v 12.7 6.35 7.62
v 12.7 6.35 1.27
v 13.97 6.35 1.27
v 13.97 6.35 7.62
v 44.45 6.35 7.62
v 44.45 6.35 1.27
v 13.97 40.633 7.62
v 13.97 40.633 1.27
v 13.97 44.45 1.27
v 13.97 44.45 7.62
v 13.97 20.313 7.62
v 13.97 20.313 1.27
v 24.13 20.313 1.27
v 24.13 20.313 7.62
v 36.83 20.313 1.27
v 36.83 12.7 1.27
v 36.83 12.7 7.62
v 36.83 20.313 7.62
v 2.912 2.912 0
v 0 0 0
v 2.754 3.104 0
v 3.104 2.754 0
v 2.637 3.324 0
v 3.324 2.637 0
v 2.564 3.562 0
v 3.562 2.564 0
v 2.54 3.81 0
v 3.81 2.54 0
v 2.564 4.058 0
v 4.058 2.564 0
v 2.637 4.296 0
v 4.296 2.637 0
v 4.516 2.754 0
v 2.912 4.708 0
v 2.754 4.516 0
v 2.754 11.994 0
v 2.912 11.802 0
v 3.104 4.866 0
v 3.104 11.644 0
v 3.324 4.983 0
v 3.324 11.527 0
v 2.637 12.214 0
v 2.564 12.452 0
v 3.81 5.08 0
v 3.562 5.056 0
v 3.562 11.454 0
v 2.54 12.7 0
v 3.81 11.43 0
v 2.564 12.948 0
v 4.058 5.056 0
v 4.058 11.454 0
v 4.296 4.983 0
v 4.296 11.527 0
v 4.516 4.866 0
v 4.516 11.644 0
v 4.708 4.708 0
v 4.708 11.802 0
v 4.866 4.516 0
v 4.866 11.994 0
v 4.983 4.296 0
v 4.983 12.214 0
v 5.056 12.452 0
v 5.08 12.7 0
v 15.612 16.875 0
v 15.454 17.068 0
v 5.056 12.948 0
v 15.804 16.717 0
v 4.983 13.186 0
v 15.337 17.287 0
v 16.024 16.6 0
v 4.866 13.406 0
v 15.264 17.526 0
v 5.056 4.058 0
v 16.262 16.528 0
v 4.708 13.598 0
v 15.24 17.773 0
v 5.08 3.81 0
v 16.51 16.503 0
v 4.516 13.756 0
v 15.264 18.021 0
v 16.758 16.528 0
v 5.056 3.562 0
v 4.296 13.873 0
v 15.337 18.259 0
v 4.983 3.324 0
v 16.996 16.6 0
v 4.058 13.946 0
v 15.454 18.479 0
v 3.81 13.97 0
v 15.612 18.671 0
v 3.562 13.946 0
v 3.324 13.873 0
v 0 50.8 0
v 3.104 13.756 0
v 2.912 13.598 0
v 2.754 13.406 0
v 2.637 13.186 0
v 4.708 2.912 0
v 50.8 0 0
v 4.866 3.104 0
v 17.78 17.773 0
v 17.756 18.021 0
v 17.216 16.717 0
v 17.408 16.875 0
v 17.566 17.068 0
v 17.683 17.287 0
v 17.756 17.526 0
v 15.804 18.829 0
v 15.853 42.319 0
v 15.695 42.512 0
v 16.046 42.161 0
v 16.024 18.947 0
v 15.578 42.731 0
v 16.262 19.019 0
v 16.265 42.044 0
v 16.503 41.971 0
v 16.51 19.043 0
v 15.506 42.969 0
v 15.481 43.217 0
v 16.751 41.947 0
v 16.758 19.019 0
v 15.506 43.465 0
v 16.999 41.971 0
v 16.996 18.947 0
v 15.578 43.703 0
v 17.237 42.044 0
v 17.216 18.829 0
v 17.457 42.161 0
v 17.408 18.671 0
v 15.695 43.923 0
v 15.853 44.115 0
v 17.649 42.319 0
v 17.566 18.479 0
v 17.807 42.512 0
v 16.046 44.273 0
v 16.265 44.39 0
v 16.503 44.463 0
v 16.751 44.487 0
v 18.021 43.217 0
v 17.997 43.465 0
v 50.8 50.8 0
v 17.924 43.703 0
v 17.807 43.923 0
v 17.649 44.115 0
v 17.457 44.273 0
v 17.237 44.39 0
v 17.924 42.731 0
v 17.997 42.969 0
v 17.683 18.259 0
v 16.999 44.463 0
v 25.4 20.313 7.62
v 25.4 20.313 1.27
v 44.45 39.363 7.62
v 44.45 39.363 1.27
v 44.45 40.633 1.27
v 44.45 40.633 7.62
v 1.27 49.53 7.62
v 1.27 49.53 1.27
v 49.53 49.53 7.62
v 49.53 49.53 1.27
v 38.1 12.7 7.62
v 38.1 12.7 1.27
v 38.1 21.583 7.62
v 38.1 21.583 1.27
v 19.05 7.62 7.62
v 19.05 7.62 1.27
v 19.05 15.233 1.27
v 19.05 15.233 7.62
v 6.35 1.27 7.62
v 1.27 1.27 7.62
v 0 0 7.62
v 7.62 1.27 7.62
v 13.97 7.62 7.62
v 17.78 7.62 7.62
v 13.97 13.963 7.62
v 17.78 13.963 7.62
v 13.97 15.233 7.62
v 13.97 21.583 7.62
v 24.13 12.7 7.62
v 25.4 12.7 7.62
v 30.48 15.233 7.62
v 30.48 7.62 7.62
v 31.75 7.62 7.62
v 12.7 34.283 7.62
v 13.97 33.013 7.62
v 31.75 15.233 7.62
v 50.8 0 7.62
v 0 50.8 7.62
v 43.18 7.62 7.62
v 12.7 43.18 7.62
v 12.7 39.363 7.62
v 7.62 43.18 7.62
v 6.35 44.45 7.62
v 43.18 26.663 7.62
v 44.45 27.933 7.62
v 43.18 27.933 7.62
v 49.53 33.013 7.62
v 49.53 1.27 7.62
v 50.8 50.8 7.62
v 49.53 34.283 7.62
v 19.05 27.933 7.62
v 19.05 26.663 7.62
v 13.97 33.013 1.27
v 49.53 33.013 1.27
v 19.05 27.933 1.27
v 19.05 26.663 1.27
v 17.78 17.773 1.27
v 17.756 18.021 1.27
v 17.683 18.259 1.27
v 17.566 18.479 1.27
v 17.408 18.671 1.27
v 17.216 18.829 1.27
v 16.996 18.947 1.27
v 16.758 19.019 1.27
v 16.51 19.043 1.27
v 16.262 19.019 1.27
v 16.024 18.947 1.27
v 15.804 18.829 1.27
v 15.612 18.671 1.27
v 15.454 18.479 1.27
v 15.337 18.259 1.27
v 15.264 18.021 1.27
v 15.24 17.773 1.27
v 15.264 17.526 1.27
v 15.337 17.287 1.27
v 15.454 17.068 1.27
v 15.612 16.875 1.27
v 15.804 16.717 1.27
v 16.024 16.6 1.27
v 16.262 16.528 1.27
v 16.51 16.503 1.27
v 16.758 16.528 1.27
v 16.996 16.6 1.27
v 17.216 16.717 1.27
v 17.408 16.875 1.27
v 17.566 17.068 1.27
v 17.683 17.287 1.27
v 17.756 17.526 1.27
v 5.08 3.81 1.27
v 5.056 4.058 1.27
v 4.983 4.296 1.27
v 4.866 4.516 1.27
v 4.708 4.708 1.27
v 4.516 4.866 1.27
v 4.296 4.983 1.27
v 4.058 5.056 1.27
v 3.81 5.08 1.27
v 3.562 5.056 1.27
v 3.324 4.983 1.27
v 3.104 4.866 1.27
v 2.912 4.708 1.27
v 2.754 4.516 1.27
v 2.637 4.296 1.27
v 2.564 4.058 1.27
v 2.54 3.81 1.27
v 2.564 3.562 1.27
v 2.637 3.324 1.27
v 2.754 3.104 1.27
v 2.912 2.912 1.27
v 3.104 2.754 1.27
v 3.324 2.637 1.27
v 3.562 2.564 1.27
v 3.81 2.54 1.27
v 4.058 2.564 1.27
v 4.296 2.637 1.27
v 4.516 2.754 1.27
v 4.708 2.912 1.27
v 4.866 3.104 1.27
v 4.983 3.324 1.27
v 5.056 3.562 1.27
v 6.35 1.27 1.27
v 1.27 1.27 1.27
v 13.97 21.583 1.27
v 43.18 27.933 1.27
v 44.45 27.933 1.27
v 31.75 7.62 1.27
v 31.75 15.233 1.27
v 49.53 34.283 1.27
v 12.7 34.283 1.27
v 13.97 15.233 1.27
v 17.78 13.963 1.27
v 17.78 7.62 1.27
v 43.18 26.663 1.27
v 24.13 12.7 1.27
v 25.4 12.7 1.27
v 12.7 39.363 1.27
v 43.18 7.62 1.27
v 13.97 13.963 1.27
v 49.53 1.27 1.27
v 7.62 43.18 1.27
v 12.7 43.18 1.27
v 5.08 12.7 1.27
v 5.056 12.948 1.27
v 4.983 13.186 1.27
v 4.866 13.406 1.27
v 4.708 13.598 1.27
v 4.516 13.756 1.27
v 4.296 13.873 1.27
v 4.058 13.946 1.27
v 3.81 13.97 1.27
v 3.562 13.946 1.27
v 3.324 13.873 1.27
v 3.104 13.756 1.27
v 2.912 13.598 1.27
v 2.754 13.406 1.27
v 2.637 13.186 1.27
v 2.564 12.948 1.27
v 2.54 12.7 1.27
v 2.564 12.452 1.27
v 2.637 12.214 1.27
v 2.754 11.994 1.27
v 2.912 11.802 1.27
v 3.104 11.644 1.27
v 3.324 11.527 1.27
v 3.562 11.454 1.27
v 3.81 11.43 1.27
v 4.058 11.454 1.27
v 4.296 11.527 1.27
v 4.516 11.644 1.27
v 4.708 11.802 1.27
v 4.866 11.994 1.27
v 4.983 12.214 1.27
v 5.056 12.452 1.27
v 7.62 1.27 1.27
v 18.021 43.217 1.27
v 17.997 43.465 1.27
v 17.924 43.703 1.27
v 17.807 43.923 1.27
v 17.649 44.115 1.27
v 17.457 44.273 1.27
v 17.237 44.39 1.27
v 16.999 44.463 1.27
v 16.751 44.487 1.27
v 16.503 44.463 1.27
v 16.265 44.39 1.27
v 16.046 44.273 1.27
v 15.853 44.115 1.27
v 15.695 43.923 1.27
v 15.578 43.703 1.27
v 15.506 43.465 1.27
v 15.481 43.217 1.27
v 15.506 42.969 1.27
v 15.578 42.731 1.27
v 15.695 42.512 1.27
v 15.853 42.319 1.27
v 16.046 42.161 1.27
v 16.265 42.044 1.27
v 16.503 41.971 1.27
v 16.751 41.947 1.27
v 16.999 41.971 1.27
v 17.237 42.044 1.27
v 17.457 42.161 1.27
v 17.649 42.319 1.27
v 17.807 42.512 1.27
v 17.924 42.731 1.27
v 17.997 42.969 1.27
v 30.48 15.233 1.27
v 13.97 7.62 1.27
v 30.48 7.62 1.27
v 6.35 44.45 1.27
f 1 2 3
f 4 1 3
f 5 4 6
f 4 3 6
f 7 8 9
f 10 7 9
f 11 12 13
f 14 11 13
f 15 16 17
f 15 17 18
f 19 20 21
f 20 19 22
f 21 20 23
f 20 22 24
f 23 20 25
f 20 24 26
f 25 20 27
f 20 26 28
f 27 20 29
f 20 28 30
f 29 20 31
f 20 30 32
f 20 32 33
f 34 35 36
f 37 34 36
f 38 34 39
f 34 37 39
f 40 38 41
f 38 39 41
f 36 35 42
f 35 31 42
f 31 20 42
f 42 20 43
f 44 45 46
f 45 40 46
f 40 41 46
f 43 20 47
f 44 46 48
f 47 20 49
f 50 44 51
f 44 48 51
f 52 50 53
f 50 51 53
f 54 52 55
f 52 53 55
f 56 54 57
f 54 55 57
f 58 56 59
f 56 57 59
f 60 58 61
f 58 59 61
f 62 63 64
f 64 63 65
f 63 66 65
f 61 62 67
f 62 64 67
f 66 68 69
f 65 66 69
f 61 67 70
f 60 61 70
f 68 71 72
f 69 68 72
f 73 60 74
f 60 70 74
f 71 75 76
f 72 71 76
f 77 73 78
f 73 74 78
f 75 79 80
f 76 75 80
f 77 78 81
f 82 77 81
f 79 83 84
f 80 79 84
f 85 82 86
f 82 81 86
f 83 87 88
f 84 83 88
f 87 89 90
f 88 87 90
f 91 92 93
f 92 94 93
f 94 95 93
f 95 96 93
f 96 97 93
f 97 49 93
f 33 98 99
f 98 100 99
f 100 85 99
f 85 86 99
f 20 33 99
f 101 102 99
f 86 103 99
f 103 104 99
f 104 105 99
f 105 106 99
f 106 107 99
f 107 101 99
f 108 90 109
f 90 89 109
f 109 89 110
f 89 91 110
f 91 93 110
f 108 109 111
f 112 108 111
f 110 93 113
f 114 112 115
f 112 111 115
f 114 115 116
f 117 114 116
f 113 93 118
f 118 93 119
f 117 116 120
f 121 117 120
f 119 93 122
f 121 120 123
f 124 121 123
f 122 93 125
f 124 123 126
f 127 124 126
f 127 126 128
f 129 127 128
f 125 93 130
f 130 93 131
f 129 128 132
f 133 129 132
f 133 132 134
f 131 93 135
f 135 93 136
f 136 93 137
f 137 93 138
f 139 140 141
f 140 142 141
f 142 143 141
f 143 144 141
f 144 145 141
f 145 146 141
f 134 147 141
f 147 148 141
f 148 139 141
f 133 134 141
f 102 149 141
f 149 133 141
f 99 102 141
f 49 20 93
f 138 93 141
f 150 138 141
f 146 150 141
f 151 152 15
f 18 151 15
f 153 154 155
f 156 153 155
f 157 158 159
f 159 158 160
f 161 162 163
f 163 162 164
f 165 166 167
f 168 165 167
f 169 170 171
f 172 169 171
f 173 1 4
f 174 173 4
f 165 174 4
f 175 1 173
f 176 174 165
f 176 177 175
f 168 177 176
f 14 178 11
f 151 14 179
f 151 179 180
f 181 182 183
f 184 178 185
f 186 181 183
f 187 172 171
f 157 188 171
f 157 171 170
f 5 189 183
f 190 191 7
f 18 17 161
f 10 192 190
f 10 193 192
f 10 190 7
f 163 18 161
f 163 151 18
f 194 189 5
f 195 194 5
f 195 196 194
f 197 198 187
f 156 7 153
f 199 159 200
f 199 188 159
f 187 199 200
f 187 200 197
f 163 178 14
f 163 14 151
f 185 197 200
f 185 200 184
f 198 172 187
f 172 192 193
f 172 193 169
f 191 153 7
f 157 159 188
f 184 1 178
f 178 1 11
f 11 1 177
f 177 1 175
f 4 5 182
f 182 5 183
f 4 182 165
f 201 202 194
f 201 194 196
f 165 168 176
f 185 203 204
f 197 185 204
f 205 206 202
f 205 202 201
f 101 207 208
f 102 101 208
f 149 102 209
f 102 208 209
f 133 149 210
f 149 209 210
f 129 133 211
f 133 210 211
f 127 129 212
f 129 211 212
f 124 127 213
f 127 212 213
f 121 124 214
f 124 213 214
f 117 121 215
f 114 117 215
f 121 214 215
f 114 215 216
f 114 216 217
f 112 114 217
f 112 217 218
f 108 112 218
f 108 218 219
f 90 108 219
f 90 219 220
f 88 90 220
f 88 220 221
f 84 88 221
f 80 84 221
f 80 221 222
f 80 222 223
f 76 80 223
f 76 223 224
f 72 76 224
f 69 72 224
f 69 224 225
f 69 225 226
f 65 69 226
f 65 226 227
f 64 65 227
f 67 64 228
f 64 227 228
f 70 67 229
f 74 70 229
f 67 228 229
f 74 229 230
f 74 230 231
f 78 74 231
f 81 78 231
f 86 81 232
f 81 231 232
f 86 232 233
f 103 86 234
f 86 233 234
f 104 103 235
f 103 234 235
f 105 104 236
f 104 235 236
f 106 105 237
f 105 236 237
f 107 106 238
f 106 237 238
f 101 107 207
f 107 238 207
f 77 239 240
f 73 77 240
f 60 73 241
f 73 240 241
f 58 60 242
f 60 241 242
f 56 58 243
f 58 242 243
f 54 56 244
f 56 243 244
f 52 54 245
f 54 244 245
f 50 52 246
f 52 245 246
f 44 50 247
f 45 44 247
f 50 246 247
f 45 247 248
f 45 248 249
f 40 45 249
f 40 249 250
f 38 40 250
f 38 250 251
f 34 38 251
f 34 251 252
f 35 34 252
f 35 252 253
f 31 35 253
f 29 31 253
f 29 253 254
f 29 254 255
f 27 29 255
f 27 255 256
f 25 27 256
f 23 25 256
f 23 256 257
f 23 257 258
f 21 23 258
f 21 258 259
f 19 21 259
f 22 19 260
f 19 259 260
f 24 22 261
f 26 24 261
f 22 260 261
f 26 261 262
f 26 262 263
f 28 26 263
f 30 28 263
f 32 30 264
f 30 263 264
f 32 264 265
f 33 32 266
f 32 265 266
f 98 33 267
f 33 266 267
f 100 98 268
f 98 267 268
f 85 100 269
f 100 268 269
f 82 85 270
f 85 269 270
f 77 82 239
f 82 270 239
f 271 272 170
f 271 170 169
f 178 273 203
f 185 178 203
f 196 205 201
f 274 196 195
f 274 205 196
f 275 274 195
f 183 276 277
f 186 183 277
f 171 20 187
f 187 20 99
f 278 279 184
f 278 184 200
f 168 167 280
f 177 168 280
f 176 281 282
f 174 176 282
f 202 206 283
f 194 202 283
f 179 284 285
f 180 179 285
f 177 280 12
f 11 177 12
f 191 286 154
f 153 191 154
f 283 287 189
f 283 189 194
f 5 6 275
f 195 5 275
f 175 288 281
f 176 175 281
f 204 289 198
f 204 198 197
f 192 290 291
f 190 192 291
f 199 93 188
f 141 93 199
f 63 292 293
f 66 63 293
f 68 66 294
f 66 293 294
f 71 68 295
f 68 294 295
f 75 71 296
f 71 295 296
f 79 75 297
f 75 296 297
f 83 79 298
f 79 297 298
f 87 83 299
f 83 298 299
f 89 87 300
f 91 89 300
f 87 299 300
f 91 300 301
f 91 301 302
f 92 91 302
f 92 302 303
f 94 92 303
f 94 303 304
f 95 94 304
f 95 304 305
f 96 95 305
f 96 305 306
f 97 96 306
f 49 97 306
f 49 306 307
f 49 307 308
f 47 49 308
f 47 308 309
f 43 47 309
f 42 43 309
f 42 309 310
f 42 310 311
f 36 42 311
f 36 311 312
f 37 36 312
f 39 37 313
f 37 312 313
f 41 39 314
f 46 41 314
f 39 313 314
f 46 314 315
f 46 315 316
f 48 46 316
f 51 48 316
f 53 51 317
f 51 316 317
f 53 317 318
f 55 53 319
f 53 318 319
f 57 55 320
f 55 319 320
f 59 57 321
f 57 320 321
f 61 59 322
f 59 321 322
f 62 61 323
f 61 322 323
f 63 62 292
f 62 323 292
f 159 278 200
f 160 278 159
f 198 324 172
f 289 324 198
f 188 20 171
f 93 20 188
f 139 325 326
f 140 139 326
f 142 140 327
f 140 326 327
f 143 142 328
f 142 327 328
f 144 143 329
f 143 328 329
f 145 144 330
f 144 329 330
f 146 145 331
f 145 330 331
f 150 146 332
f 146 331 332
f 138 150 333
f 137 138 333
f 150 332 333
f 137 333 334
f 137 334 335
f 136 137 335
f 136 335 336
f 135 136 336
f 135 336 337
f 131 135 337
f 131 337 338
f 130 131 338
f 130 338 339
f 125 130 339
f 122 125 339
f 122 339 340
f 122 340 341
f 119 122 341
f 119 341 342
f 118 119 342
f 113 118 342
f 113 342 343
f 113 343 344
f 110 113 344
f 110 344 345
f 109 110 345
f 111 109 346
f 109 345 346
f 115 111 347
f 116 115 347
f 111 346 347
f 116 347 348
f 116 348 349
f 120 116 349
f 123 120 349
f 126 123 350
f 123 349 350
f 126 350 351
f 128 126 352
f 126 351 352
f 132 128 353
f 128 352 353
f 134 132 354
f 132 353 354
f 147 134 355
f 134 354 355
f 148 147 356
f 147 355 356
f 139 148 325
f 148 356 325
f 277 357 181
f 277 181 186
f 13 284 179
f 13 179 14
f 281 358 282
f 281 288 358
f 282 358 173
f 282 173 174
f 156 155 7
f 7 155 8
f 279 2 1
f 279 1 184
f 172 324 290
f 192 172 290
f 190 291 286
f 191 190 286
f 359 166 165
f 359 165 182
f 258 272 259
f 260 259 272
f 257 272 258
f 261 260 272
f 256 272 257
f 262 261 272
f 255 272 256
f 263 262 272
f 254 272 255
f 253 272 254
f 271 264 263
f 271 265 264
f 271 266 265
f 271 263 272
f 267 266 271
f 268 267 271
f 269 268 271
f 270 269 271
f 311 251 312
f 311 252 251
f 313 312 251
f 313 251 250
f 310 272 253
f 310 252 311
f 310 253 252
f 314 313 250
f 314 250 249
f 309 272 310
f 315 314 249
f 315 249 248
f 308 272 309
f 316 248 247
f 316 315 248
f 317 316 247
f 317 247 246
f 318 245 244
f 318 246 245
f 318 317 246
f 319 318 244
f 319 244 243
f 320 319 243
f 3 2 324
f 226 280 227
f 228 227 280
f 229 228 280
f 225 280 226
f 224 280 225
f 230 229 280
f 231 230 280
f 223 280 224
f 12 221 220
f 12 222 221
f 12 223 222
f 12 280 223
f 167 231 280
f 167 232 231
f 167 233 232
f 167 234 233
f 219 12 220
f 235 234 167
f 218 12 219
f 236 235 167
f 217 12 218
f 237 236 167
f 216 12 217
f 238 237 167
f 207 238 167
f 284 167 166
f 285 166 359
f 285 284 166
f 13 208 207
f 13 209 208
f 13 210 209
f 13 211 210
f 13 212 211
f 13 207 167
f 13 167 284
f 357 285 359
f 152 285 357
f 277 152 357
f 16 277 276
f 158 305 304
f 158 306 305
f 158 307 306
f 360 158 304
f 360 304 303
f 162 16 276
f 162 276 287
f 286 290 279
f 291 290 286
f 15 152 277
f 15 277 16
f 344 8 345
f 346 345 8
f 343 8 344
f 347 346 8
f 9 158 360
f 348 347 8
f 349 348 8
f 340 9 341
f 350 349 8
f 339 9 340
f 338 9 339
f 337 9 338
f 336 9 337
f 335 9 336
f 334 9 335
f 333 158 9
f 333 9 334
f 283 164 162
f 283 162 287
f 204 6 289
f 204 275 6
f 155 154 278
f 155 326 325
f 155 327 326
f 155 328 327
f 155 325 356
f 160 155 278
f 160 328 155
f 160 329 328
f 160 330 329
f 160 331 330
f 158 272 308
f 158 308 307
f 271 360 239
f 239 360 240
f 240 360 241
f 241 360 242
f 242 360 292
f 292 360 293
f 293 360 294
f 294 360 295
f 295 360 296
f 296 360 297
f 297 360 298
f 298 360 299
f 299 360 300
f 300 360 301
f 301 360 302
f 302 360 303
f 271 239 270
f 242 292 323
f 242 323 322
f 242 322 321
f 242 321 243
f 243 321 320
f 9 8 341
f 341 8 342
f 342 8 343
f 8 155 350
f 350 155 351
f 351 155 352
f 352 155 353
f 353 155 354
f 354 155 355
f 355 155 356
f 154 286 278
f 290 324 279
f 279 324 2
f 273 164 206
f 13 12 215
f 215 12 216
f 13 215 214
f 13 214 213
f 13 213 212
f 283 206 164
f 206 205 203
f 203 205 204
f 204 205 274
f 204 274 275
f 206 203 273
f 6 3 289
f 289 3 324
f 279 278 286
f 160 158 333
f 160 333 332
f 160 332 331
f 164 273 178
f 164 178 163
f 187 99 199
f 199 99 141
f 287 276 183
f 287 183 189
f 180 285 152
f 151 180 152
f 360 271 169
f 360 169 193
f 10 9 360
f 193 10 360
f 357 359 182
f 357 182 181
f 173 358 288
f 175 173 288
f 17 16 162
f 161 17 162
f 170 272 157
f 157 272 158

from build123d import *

# Parameters (mm, degrees)
F0_W      = 50.8
F0_H      = 50.8
F1_DEPTH  = 7.62
F2_T      = -1.27
F3_W      = 1.27
F3_H      = 43.18
F4_DEPTH  = 6.35
F5_R      = 1.27
F6_DEPTH  = 25.4
F8_DEPTH  = 6.35
F9_W      = 36.83
F9_H      = 1.27
F10_DEPTH = 6.35
F11_W     = 1.27
F11_H     = 26.6634474313
F12_DEPTH = 6.35
F13_W     = 30.48
F13_H     = 1.27
F14_DEPTH = 6.35
F15_W     = 1.27
F15_H     = 20.3134474313
F16_DEPTH = 6.35
F17_W     = 24.13
F17_H     = 1.27
F18_DEPTH = 6.35
F19_W     = 24.13
F19_H     = 1.27
F20_DEPTH = 6.35
F21_W     = 1.27
F21_H     = 7.6134474313
F22_DEPTH = 6.35
F23_W     = 1.27
F23_H     = 7.6134474313
F24_DEPTH = 6.35
F25_W     = 1.27
F25_H     = 7.6134474313
F26_DEPTH = 6.35
F27_W     = 3.81
F27_H     = 1.27
F28_DEPTH = 6.35
F29_R     = 1.27
F30_DEPTH = 25.4
F31_R     = 1.27
F32_DEPTH = 25.4
F33_R     = 1.27
F34_DEPTH = 25.4


with BuildPart() as f1:
    # F0 (on Top) → F1 (new body)
    with BuildSketch(Plane.XY):
        with Locations((25.4, 25.4)):
            Rectangle(F0_W, F0_H)
    extrude(amount=F1_DEPTH)

    # F2
    f2_openings = [f1.faces().sort_by_distance(p)[0] for p in [
        (25.4, 25.4, 7.62),
    ]]
    offset(amount=F2_T, openings=f2_openings)

    # F3 (on face) → F4 (join)
    with BuildSketch(Plane.XY.offset(1.27)):
        with Locations((6.985, 22.86)):
            Rectangle(F3_W, F3_H)
    extrude(amount=F4_DEPTH)

    # F5 (on face) → F6 (cut)
    with BuildSketch(Plane.XY.offset(1.27)):
        with Locations((3.81, 3.81)):
            Circle(F5_R)
    extrude(amount=-F6_DEPTH, mode=Mode.SUBTRACT)

    # F7 (on face) → F8 (join)
    with BuildSketch(Plane.XY.offset(1.27)):
        Polygon((13.97, 44.45), (7.62, 44.45), (7.62, 43.18), (12.7, 43.18), (12.7, 39.3634474313), (44.45, 39.3634474313), (44.45, 40.6334474313), (13.97, 40.6334474313), align=None)
    extrude(amount=F8_DEPTH)

    # F9 (on face) → F10 (join)
    with BuildSketch(Plane.XY.offset(1.27)):
        with Locations((31.115, 33.6484474313)):
            Rectangle(F9_W, F9_H)
    extrude(amount=F10_DEPTH)

    # F11 (on face) → F12 (join)
    with BuildSketch(Plane.XY.offset(1.27)):
        with Locations((13.335, 19.6817237157)):
            Rectangle(F11_W, F11_H)
    extrude(amount=F12_DEPTH)

    # F13 (on face) → F14 (join)
    with BuildSketch(Plane.XY.offset(1.27)):
        with Locations((29.21, 6.985)):
            Rectangle(F13_W, F13_H)
    extrude(amount=F14_DEPTH)

    # F15 (on face) → F16 (join)
    with BuildSketch(Plane.XY.offset(1.27)):
        with Locations((43.815, 17.7767237157)):
            Rectangle(F15_W, F15_H)
    extrude(amount=F16_DEPTH)

    # F17 (on face) → F18 (join)
    with BuildSketch(Plane.XY.offset(1.27)):
        with Locations((31.115, 27.2984474313)):
            Rectangle(F17_W, F17_H)
    extrude(amount=F18_DEPTH)

    # F19 (on face) → F20 (join)
    with BuildSketch(Plane.XY.offset(1.27)):
        with Locations((26.035, 20.9484474313)):
            Rectangle(F19_W, F19_H)
    extrude(amount=F20_DEPTH)

    # F21 (on face) → F22 (join)
    with BuildSketch(Plane.XY.offset(1.27)):
        with Locations((37.465, 16.5067237157)):
            Rectangle(F21_W, F21_H)
    extrude(amount=F22_DEPTH)

    # F23 (on face) → F24 (join)
    with BuildSketch(Plane.XY.offset(1.27)):
        with Locations((31.115, 11.4267237157)):
            Rectangle(F23_W, F23_H)
    extrude(amount=F24_DEPTH)

    # F25 (on face) → F26 (join)
    with BuildSketch(Plane.XY.offset(1.27)):
        with Locations((24.765, 16.5067237157)):
            Rectangle(F25_W, F25_H)
    extrude(amount=F26_DEPTH)

    # F27 (on face) → F28 (join)
    with BuildSketch(Plane.XY.offset(1.27)):
        Polygon((17.78, 7.62), (19.05, 7.62), (19.05, 15.2334474313), (17.78, 15.2334474313), (17.78, 13.9634474313), align=None)
        with Locations((15.875, 14.5984474313)):
            Rectangle(F27_W, F27_H)
    extrude(amount=F28_DEPTH)

    # F29 (on face) → F30 (cut)
    with BuildSketch(Plane.XY.offset(1.27)):
        with Locations((16.51, 17.7734474313)):
            Circle(F29_R)
    extrude(amount=-F30_DEPTH, mode=Mode.SUBTRACT)

    # F31 (on face) → F32 (cut)
    with BuildSketch(Plane.XY.offset(1.27)):
        with Locations((3.81, 12.7)):
            Circle(F31_R)
    extrude(amount=-F32_DEPTH, mode=Mode.SUBTRACT)

    # F33 (on face) → F34 (cut)
    with BuildSketch(Plane.XY.offset(1.27)):
        with Locations((16.7510975152, 43.2170815766)):
            Circle(F33_R)
    extrude(amount=-F34_DEPTH, mode=Mode.SUBTRACT)


solid = f1.part
